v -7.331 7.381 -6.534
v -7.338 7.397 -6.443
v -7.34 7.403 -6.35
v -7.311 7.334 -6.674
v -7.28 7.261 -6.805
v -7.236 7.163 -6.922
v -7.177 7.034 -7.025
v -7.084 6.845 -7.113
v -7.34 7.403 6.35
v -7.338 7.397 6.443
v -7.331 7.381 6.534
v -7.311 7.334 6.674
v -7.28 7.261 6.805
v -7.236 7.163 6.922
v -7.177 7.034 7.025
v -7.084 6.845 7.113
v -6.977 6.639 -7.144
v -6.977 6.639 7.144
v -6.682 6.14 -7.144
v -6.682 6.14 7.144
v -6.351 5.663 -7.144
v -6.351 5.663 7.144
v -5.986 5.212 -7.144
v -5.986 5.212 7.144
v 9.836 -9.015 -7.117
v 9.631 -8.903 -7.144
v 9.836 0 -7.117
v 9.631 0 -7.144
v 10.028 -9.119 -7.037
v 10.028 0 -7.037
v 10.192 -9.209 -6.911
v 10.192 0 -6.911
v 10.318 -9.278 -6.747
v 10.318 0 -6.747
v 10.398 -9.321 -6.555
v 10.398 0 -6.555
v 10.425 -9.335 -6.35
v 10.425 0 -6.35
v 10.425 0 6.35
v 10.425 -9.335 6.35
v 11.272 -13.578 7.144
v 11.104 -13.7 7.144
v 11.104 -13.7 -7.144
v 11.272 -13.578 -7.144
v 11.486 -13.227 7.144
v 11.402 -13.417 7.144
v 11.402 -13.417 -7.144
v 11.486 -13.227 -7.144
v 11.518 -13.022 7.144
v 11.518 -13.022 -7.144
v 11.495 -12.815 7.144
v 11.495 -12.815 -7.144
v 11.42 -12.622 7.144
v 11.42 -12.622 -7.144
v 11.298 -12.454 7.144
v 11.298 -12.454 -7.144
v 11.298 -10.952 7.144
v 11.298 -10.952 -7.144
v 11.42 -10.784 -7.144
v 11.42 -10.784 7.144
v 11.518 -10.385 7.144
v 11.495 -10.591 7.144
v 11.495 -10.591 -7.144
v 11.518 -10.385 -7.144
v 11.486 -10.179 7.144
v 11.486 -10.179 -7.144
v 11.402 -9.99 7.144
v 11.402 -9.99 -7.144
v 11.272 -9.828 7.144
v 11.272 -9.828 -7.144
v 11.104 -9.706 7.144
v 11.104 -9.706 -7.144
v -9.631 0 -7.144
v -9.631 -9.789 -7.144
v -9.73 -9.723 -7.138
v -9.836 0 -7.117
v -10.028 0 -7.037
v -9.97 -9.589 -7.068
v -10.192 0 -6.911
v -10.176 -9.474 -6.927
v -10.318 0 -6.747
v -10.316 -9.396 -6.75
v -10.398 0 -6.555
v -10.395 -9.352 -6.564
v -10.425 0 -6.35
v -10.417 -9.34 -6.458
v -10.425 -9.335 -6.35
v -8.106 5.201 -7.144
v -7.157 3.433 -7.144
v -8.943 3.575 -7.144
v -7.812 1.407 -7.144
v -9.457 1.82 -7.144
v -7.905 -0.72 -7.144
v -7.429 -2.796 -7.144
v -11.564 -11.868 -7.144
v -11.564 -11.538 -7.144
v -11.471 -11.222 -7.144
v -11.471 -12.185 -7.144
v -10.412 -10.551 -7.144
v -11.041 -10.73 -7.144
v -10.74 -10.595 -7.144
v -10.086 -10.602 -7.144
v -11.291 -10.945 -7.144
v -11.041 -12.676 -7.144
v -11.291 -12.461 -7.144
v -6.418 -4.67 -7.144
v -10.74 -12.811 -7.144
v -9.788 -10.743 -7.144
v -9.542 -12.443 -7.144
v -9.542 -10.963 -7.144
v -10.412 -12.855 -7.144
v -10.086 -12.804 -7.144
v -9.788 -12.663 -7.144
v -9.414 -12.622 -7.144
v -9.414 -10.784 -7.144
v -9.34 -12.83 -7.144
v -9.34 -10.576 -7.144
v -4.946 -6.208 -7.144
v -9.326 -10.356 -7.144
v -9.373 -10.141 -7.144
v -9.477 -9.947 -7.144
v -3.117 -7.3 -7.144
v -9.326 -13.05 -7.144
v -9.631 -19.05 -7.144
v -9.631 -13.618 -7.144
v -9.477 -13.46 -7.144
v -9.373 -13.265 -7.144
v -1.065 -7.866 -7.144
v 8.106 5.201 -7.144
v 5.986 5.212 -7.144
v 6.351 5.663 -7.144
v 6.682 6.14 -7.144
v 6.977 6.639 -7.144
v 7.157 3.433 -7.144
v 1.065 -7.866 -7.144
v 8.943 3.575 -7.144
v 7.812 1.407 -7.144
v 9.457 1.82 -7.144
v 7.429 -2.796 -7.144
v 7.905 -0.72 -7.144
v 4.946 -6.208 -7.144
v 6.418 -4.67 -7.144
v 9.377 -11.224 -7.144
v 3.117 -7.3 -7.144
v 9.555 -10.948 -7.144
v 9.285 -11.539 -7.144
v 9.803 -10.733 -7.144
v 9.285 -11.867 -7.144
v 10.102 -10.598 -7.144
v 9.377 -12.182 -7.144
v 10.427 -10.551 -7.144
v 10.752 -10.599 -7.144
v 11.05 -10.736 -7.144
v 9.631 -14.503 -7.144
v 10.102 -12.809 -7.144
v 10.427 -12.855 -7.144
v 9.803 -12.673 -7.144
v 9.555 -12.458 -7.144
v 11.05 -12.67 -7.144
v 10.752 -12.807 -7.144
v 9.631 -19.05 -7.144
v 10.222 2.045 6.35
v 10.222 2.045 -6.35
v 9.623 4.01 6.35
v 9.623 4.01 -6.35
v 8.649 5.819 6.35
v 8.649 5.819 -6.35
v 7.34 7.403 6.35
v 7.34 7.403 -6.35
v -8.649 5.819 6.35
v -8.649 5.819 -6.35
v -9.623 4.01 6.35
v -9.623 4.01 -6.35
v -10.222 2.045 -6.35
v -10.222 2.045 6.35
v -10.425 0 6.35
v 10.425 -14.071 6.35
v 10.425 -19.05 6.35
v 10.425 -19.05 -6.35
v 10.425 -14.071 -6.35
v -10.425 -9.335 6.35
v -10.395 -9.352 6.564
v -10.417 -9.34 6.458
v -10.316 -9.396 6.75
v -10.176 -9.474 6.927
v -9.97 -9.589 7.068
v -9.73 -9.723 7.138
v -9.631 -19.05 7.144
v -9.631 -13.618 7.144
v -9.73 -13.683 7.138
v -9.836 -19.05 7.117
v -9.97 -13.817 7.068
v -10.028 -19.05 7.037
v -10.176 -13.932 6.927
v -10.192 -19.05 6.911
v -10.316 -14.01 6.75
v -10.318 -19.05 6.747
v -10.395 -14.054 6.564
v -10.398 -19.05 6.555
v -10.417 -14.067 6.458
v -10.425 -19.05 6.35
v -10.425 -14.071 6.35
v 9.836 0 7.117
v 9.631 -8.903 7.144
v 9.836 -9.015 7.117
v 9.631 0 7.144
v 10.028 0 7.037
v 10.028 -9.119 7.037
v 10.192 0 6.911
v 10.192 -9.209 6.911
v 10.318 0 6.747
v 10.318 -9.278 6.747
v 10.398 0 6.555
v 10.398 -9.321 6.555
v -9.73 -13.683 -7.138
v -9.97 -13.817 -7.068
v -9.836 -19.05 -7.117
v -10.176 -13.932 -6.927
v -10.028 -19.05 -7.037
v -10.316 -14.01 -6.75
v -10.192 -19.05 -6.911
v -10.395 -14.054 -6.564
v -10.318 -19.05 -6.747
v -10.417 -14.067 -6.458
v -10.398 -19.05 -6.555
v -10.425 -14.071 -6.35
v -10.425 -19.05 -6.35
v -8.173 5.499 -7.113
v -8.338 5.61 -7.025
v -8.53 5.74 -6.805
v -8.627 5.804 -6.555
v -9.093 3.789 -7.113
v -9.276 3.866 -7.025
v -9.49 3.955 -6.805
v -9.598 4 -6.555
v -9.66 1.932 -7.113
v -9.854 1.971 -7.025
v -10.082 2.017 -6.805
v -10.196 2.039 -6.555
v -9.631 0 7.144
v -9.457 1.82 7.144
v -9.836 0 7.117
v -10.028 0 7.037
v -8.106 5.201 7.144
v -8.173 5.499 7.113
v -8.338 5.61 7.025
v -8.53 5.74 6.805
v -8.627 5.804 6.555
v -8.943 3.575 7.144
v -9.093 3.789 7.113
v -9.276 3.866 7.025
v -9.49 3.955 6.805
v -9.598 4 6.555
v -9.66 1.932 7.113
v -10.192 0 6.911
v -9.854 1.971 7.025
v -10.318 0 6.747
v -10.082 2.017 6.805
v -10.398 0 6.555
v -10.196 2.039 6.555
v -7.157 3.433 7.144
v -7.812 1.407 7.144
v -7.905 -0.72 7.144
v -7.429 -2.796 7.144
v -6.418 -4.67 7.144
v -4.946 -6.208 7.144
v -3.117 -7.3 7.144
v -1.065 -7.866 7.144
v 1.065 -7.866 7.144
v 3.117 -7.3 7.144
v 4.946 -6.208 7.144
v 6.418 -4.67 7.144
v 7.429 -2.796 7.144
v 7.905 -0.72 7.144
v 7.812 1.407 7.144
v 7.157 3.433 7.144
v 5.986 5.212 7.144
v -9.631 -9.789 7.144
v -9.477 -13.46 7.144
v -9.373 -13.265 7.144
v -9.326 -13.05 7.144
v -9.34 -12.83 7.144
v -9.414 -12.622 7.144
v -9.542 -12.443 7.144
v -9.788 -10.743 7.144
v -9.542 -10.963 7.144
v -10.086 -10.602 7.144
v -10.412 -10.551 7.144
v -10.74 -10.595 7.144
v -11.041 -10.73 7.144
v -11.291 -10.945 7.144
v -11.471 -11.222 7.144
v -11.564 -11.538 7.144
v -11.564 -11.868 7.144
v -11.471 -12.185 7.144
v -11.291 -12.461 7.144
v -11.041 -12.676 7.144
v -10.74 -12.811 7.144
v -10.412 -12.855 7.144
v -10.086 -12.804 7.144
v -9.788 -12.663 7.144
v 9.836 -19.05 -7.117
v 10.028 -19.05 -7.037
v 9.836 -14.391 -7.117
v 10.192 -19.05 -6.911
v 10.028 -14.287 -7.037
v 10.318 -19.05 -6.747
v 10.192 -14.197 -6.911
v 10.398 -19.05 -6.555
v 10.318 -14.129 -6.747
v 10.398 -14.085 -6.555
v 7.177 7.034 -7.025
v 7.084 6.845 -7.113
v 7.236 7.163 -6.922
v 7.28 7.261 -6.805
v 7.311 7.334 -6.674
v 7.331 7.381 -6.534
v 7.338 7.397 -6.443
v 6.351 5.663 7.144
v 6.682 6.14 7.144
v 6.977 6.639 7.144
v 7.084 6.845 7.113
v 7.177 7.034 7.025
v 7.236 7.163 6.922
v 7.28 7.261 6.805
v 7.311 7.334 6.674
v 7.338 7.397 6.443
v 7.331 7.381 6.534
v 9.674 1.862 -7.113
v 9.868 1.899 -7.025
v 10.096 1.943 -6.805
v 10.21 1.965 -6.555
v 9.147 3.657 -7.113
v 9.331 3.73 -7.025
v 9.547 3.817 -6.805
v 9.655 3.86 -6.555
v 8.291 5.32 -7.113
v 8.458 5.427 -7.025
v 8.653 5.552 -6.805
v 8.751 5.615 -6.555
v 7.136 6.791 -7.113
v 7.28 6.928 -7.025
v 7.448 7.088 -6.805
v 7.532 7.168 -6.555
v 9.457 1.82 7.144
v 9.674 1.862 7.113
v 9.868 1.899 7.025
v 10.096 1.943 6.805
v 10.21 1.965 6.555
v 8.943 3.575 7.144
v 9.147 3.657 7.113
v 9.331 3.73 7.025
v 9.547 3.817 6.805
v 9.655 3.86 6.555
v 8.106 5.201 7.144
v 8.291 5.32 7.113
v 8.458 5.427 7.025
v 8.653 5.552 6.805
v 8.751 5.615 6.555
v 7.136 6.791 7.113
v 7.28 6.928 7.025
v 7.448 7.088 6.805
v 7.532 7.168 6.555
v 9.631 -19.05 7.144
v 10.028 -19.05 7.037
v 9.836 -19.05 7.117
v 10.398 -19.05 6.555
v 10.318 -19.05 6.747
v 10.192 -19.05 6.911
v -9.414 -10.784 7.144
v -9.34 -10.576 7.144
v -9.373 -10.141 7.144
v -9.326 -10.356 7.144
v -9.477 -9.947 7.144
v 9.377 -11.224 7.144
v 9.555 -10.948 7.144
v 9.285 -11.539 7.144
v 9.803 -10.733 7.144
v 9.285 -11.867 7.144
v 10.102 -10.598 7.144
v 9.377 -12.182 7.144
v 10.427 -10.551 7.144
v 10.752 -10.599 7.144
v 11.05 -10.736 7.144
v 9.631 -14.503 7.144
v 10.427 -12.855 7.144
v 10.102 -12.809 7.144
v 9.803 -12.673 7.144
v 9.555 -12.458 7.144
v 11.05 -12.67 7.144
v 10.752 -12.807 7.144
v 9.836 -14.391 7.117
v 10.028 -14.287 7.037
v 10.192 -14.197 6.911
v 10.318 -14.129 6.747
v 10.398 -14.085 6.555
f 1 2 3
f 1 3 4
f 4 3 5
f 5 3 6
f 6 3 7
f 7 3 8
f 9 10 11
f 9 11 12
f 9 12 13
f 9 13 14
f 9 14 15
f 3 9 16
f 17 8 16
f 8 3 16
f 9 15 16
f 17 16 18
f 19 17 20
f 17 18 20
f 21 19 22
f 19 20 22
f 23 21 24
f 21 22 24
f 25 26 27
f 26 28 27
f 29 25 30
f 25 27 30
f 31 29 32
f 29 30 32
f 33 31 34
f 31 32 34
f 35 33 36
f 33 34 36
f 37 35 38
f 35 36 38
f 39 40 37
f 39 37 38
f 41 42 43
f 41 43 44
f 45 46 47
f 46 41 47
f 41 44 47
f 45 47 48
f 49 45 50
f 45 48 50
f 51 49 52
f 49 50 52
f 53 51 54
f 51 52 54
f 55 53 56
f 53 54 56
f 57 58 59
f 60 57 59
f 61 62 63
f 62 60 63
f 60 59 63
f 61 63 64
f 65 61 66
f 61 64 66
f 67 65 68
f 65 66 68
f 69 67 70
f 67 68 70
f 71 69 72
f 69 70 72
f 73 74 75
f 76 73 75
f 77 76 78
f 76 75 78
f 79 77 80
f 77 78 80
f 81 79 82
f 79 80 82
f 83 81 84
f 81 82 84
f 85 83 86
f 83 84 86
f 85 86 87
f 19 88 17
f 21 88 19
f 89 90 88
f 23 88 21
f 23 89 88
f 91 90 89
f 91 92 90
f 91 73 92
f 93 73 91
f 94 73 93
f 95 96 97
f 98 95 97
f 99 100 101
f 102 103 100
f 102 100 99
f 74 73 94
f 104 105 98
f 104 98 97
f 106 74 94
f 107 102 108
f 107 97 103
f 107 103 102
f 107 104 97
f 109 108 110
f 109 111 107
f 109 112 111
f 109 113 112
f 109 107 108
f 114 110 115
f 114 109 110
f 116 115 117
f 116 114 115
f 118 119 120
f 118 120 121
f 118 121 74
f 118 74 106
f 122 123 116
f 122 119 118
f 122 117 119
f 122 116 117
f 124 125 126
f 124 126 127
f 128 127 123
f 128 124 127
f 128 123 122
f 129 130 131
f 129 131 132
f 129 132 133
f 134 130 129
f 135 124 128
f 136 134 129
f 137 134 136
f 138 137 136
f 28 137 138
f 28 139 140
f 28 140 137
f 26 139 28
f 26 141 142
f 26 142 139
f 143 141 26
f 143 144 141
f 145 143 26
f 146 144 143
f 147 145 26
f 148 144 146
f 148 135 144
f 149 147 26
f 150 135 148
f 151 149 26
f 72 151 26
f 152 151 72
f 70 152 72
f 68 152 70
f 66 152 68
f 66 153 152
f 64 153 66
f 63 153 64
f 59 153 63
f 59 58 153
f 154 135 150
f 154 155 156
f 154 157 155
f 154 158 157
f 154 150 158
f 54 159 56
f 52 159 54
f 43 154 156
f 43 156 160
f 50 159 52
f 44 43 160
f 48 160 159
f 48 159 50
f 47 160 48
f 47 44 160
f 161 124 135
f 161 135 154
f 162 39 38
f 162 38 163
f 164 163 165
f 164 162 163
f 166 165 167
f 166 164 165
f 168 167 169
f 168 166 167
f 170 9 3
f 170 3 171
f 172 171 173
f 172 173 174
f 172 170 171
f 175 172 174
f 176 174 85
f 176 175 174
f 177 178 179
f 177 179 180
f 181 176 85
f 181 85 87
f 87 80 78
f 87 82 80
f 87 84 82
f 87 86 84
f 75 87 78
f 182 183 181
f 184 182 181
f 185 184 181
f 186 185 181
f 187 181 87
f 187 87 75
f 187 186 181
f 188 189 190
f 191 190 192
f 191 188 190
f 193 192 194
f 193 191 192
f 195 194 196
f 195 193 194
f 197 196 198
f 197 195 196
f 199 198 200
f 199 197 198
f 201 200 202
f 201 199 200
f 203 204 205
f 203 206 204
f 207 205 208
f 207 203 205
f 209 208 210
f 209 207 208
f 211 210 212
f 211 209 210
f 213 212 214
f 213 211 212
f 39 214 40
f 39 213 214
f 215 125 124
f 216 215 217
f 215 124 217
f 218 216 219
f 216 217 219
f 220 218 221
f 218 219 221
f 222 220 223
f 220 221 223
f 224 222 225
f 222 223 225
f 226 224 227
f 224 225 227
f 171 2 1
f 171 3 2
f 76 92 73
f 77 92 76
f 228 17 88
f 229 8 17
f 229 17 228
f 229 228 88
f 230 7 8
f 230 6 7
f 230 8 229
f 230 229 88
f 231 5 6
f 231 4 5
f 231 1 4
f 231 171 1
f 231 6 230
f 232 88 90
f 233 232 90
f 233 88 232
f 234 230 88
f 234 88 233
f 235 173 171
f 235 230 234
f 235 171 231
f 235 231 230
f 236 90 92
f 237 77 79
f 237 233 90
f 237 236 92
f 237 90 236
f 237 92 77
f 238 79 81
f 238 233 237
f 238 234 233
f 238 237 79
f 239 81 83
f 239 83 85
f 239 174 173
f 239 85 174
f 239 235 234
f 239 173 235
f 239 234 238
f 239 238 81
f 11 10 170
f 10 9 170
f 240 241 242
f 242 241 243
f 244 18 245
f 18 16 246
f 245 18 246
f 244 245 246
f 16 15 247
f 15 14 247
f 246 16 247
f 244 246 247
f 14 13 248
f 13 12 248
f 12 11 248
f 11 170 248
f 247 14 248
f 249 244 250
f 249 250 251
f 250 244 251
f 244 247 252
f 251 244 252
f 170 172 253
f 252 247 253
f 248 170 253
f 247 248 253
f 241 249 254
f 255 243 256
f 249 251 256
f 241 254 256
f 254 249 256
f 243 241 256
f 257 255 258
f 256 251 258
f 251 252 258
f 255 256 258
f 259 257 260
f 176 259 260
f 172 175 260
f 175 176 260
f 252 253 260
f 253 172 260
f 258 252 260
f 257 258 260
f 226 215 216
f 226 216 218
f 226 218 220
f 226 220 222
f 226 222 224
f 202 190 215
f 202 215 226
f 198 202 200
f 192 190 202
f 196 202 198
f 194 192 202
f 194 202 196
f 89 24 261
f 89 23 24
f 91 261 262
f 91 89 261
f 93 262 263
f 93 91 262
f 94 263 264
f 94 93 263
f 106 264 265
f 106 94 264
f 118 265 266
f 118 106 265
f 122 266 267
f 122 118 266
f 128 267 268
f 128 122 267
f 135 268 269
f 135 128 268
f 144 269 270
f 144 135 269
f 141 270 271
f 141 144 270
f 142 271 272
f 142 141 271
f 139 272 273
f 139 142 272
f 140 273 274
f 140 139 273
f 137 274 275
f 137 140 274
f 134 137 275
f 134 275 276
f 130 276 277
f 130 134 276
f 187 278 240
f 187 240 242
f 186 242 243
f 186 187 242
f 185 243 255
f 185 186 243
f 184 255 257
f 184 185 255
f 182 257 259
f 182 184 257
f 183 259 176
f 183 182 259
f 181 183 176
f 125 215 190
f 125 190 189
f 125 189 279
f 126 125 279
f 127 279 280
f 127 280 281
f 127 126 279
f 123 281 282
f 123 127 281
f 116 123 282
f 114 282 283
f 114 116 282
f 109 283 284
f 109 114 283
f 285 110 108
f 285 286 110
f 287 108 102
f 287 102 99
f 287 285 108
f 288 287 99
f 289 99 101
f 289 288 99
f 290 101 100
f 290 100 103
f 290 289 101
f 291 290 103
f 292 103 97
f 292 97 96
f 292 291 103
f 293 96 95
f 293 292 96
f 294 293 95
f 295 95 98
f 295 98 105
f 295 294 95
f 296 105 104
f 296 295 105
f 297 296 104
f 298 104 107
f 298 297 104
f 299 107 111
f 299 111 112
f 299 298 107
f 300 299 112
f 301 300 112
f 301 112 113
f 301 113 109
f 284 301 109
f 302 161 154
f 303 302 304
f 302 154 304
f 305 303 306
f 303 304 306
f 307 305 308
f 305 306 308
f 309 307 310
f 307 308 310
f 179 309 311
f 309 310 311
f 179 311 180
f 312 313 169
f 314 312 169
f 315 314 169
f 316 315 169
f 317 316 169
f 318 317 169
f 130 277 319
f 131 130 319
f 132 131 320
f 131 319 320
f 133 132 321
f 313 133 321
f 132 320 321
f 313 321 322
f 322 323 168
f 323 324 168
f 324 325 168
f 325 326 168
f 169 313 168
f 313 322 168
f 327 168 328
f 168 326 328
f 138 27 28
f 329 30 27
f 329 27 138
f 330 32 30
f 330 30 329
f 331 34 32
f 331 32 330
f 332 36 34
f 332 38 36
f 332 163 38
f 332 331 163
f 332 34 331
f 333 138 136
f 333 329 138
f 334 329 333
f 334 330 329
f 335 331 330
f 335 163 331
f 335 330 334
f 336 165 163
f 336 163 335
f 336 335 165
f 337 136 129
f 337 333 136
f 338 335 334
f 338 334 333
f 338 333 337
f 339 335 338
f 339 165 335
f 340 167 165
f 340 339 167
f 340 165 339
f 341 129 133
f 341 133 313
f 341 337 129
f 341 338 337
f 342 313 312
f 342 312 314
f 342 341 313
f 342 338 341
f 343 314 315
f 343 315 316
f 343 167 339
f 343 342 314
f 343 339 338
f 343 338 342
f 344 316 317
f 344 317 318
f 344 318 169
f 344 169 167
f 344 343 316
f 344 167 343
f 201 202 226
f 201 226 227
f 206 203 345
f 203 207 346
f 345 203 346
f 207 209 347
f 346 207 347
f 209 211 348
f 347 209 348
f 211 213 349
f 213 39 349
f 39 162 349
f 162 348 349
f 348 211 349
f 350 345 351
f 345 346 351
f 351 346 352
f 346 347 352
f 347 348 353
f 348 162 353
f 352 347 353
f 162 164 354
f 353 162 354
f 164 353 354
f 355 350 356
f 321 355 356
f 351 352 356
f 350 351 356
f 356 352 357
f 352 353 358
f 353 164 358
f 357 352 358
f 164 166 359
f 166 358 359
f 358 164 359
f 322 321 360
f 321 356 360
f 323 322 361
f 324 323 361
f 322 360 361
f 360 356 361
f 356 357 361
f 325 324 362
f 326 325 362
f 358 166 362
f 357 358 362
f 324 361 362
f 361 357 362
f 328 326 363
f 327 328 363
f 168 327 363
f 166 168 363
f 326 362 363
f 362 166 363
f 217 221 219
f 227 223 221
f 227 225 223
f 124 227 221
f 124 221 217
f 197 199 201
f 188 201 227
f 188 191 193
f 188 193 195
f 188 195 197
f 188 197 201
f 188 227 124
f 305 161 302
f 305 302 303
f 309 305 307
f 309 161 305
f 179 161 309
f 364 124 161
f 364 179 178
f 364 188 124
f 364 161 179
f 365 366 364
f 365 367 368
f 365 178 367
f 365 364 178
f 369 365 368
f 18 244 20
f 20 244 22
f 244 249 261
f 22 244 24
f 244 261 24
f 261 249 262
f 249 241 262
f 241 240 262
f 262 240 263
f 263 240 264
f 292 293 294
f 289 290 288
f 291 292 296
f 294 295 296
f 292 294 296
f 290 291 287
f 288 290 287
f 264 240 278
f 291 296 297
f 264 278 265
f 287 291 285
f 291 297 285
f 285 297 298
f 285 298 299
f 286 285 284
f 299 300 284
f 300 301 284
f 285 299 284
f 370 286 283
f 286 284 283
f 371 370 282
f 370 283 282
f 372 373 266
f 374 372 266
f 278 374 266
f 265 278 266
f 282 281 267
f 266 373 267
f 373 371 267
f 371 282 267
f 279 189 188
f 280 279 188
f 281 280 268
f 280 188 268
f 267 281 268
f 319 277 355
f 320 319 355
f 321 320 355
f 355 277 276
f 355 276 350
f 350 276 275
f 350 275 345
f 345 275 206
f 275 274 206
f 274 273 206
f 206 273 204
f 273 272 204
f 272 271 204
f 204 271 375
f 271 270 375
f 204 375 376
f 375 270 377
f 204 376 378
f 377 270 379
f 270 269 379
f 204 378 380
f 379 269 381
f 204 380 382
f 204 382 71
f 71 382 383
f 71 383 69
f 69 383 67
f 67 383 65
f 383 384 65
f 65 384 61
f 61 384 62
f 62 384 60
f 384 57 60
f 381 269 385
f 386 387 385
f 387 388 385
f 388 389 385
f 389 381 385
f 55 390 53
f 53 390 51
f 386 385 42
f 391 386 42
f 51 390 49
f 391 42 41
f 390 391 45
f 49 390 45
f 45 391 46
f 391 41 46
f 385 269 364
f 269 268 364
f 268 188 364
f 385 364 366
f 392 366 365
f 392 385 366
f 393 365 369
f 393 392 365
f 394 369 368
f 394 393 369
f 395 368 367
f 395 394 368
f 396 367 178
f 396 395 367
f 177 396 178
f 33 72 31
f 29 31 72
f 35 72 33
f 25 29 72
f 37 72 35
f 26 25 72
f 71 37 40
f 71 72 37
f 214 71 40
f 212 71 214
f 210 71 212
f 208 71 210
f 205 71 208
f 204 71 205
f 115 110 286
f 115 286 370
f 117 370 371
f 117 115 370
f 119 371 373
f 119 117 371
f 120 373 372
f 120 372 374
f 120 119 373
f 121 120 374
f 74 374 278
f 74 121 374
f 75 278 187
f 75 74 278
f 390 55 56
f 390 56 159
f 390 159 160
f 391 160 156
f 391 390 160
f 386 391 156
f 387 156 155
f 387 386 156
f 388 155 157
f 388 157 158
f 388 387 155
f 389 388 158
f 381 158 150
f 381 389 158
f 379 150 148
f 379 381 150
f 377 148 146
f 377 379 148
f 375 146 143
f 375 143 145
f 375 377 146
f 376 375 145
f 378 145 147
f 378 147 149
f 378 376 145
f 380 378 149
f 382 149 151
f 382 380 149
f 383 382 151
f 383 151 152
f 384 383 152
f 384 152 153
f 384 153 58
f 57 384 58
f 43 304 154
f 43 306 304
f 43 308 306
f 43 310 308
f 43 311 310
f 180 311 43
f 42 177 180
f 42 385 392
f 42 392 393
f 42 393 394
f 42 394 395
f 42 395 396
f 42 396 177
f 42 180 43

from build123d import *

# Parameters (mm, degrees)
SKETCH1_R            = 7.9375
BOSS_EXTRUDE19_DEPTH = 7.14375
SKETCH2_R            = 7.9375
CUT_EXTRUDE2_DEPTH   = 27.966981115
FILLET6_R            = 0.79375
FILLET7_R            = 0.79375


with BuildPart() as part:
    # Sketch1 → Boss-Extrude19 (new, symmetric)
    with BuildSketch(Plane.XY):
        with BuildLine():
            Line((-10.424745199, -14.070645408), (-10.424745199, -19.05))
            Line((-10.424745199, -19.05), (10.424745199, -19.05))
            Line((10.424745199, -19.05), (10.424745199, -14.070645408))
            Line((10.424745199, -14.070645408), (12.656338894, -12.854690118))
            Line((12.656338894, -12.854690118), (11.297531111, -12.4543891))
            ThreePointArc((11.297531111, -12.4543891), (9.273116661, -11.703061579), (11.297531111, -10.951734059))
            Line((11.297531111, -10.951734059), (12.656338894, -10.551433041))
            Line((12.656338894, -10.551433041), (10.424745199, -9.33547775))
            Line((10.424745199, -9.33547775), (10.424745199, 0))
            ThreePointArc((10.424745199, 0), (0, 10.424745199), (-10.424745199, 0))
            Line((-10.424745199, 0), (-10.424745199, -9.33547775))
            Line((-10.424745199, -9.33547775), (-8.193151504, -10.580610736))
            Line((-8.193151504, -10.580610736), (-9.542093319, -10.963349508))
            ThreePointArc((-9.542093319, -10.963349508), (-11.576373738, -11.703061579), (-9.542093319, -12.442773651))
            Line((-9.542093319, -12.442773651), (-8.193151504, -12.825512422))
            Line((-8.193151504, -12.825512422), (-10.424745199, -14.070645408))
        make_face()
        Circle(SKETCH1_R, mode=Mode.SUBTRACT)
    extrude(amount=BOSS_EXTRUDE19_DEPTH, both=True)

    # Sketch2 → Cut-Extrude2 (cut, through all)
    with BuildSketch(Plane.XY.offset(7.14375)):
        with Locations((0, 10.424745199)):
            Circle(SKETCH2_R)
    extrude(amount=-CUT_EXTRUDE2_DEPTH, mode=Mode.SUBTRACT)

    # Fillet6
    # the kernel refuses this fillet: 0.79375 mm, written as the material it adds along each edge
    with BuildSketch(Plane(origin=(-8.193151504, -12.825512422, -7.14375), x_dir=(-0.8732655856931067, -0.4872445144319999, 0), z_dir=(0, 0, 1))) as fillet6_piece_1:
        with BuildLine():
            CenterArc((1.76022016, -0.79375), FILLET6_R, 90, 104.42604794)
            Line((0.991497097, -0.991497097), (0.976122636, -0.995452039))
            ThreePointArc((0.976122636, -0.995452039), (0.484523228, -0.506973869), (-0.01122532, -0.01122532))
            Line((-0.01122532, -0.01122532), (0, 0.015875))
            Line((0, 0.015875), (1.76022016, 0.015875))
            Line((1.76022016, 0.015875), (1.76022016, 0))
        make_face()
    extrude(amount=14.2875)
    with BuildSketch(Plane(origin=(-8.193151504, -10.580610736, -7.14375), x_dir=(-0.962025917671251, -0.2729581171696266, 0), z_dir=(0, 0, 1))) as fillet6_piece_2:
        with BuildLine():
            CenterArc((1.805929619, -0.683397604), FILLET6_R, 120.57395206, 104.42604794)
            Line((1.244663612, -1.244663612), (1.233438292, -1.255888932))
            Line((1.233438292, -1.255888932), (-0.01122532, -0.01122532))
            Line((-0.01122532, -0.01122532), (0, 0.015875))
            ThreePointArc((0, 0.015875), (0.701094321, 0.015875), (1.394113822, 0.013667952))
            Line((1.394113822, 0.013667952), (1.402188642, 0))
        make_face()
    extrude(amount=14.2875)
    # the kernel refuses this fillet: 0.79375 mm, written as the material it takes off along each edge
    with BuildSketch(Plane(origin=(12.656338894, -12.854690118, -11.562971269), x_dir=(-0.9592408744906186, 0.28258971089987234, 0), z_dir=(0, 0, 1))) as fillet6_2_piece_1:
        with BuildLine():
            CenterArc((1.811210538, 0.688678523), FILLET6_R, 135, 105.183982463)
            Line((1.249944531, 1.249944531), (1.238719211, 1.261169851))
            Line((1.238719211, 1.261169851), (-0.01122532, 0.01122532))
            Line((-0.01122532, 0.01122532), (0, -0.015875))
            ThreePointArc((0, -0.015875), (0.708272458, -0.015875), (1.408651603, -0.01377357))
            Line((1.408651603, -0.01377357), (1.416544915, 0))
        make_face()
    extrude(amount=23.125942539, mode=Mode.SUBTRACT)
    with BuildSketch(Plane(origin=(12.656338894, -10.551433041, -11.562971269), x_dir=(-0.8781068280147701, 0.4784646262722449, 0), z_dir=(0, 0, 1))) as fillet6_2_piece_2:
        with BuildLine():
            CenterArc((1.767688508, 0.79375), FILLET6_R, 164.816017537, 105.183982463)
            Line((1.001648515, 1.001648515), (0.986327716, 1.005806486))
            ThreePointArc((0.986327716, 1.005806486), (0.489598938, 0.512049578), (-0.01122532, 0.01122532))
            Line((-0.01122532, 0.01122532), (0, -0.015875))
            Line((0, -0.015875), (1.767688508, -0.015875))
            Line((1.767688508, -0.015875), (1.767688508, 0))
        make_face()
    extrude(amount=23.125942539, mode=Mode.SUBTRACT)

    # Fillet7
    fillet7_edges = [part.edges().sort_by_distance(p)[0] for p in [
        (-10.424745199, -16.560322704, -7.14375),
        (-10.424745199, -4.667738875, -7.14375),
        (-9.622646342, 4.009986266, -7.14375),
        (9.622646342, 4.009986266, -7.14375),
        (10.424745199, -4.667738875, -7.14375),
        (10.424745199, -16.560322704, -7.14375),
        (10.424745199, -16.560322704, 7.14375),
        (-10.424745199, -16.560322704, 7.14375),
        (-10.424745199, -4.667738875, 7.14375),
        (-9.622646342, 4.009986266, 7.14375),
        (9.622646342, 4.009986266, 7.14375),
        (10.424745199, -4.667738875, 7.14375),
    ]]
    fillet(fillet7_edges, radius=FILLET7_R)


solid = part.part
